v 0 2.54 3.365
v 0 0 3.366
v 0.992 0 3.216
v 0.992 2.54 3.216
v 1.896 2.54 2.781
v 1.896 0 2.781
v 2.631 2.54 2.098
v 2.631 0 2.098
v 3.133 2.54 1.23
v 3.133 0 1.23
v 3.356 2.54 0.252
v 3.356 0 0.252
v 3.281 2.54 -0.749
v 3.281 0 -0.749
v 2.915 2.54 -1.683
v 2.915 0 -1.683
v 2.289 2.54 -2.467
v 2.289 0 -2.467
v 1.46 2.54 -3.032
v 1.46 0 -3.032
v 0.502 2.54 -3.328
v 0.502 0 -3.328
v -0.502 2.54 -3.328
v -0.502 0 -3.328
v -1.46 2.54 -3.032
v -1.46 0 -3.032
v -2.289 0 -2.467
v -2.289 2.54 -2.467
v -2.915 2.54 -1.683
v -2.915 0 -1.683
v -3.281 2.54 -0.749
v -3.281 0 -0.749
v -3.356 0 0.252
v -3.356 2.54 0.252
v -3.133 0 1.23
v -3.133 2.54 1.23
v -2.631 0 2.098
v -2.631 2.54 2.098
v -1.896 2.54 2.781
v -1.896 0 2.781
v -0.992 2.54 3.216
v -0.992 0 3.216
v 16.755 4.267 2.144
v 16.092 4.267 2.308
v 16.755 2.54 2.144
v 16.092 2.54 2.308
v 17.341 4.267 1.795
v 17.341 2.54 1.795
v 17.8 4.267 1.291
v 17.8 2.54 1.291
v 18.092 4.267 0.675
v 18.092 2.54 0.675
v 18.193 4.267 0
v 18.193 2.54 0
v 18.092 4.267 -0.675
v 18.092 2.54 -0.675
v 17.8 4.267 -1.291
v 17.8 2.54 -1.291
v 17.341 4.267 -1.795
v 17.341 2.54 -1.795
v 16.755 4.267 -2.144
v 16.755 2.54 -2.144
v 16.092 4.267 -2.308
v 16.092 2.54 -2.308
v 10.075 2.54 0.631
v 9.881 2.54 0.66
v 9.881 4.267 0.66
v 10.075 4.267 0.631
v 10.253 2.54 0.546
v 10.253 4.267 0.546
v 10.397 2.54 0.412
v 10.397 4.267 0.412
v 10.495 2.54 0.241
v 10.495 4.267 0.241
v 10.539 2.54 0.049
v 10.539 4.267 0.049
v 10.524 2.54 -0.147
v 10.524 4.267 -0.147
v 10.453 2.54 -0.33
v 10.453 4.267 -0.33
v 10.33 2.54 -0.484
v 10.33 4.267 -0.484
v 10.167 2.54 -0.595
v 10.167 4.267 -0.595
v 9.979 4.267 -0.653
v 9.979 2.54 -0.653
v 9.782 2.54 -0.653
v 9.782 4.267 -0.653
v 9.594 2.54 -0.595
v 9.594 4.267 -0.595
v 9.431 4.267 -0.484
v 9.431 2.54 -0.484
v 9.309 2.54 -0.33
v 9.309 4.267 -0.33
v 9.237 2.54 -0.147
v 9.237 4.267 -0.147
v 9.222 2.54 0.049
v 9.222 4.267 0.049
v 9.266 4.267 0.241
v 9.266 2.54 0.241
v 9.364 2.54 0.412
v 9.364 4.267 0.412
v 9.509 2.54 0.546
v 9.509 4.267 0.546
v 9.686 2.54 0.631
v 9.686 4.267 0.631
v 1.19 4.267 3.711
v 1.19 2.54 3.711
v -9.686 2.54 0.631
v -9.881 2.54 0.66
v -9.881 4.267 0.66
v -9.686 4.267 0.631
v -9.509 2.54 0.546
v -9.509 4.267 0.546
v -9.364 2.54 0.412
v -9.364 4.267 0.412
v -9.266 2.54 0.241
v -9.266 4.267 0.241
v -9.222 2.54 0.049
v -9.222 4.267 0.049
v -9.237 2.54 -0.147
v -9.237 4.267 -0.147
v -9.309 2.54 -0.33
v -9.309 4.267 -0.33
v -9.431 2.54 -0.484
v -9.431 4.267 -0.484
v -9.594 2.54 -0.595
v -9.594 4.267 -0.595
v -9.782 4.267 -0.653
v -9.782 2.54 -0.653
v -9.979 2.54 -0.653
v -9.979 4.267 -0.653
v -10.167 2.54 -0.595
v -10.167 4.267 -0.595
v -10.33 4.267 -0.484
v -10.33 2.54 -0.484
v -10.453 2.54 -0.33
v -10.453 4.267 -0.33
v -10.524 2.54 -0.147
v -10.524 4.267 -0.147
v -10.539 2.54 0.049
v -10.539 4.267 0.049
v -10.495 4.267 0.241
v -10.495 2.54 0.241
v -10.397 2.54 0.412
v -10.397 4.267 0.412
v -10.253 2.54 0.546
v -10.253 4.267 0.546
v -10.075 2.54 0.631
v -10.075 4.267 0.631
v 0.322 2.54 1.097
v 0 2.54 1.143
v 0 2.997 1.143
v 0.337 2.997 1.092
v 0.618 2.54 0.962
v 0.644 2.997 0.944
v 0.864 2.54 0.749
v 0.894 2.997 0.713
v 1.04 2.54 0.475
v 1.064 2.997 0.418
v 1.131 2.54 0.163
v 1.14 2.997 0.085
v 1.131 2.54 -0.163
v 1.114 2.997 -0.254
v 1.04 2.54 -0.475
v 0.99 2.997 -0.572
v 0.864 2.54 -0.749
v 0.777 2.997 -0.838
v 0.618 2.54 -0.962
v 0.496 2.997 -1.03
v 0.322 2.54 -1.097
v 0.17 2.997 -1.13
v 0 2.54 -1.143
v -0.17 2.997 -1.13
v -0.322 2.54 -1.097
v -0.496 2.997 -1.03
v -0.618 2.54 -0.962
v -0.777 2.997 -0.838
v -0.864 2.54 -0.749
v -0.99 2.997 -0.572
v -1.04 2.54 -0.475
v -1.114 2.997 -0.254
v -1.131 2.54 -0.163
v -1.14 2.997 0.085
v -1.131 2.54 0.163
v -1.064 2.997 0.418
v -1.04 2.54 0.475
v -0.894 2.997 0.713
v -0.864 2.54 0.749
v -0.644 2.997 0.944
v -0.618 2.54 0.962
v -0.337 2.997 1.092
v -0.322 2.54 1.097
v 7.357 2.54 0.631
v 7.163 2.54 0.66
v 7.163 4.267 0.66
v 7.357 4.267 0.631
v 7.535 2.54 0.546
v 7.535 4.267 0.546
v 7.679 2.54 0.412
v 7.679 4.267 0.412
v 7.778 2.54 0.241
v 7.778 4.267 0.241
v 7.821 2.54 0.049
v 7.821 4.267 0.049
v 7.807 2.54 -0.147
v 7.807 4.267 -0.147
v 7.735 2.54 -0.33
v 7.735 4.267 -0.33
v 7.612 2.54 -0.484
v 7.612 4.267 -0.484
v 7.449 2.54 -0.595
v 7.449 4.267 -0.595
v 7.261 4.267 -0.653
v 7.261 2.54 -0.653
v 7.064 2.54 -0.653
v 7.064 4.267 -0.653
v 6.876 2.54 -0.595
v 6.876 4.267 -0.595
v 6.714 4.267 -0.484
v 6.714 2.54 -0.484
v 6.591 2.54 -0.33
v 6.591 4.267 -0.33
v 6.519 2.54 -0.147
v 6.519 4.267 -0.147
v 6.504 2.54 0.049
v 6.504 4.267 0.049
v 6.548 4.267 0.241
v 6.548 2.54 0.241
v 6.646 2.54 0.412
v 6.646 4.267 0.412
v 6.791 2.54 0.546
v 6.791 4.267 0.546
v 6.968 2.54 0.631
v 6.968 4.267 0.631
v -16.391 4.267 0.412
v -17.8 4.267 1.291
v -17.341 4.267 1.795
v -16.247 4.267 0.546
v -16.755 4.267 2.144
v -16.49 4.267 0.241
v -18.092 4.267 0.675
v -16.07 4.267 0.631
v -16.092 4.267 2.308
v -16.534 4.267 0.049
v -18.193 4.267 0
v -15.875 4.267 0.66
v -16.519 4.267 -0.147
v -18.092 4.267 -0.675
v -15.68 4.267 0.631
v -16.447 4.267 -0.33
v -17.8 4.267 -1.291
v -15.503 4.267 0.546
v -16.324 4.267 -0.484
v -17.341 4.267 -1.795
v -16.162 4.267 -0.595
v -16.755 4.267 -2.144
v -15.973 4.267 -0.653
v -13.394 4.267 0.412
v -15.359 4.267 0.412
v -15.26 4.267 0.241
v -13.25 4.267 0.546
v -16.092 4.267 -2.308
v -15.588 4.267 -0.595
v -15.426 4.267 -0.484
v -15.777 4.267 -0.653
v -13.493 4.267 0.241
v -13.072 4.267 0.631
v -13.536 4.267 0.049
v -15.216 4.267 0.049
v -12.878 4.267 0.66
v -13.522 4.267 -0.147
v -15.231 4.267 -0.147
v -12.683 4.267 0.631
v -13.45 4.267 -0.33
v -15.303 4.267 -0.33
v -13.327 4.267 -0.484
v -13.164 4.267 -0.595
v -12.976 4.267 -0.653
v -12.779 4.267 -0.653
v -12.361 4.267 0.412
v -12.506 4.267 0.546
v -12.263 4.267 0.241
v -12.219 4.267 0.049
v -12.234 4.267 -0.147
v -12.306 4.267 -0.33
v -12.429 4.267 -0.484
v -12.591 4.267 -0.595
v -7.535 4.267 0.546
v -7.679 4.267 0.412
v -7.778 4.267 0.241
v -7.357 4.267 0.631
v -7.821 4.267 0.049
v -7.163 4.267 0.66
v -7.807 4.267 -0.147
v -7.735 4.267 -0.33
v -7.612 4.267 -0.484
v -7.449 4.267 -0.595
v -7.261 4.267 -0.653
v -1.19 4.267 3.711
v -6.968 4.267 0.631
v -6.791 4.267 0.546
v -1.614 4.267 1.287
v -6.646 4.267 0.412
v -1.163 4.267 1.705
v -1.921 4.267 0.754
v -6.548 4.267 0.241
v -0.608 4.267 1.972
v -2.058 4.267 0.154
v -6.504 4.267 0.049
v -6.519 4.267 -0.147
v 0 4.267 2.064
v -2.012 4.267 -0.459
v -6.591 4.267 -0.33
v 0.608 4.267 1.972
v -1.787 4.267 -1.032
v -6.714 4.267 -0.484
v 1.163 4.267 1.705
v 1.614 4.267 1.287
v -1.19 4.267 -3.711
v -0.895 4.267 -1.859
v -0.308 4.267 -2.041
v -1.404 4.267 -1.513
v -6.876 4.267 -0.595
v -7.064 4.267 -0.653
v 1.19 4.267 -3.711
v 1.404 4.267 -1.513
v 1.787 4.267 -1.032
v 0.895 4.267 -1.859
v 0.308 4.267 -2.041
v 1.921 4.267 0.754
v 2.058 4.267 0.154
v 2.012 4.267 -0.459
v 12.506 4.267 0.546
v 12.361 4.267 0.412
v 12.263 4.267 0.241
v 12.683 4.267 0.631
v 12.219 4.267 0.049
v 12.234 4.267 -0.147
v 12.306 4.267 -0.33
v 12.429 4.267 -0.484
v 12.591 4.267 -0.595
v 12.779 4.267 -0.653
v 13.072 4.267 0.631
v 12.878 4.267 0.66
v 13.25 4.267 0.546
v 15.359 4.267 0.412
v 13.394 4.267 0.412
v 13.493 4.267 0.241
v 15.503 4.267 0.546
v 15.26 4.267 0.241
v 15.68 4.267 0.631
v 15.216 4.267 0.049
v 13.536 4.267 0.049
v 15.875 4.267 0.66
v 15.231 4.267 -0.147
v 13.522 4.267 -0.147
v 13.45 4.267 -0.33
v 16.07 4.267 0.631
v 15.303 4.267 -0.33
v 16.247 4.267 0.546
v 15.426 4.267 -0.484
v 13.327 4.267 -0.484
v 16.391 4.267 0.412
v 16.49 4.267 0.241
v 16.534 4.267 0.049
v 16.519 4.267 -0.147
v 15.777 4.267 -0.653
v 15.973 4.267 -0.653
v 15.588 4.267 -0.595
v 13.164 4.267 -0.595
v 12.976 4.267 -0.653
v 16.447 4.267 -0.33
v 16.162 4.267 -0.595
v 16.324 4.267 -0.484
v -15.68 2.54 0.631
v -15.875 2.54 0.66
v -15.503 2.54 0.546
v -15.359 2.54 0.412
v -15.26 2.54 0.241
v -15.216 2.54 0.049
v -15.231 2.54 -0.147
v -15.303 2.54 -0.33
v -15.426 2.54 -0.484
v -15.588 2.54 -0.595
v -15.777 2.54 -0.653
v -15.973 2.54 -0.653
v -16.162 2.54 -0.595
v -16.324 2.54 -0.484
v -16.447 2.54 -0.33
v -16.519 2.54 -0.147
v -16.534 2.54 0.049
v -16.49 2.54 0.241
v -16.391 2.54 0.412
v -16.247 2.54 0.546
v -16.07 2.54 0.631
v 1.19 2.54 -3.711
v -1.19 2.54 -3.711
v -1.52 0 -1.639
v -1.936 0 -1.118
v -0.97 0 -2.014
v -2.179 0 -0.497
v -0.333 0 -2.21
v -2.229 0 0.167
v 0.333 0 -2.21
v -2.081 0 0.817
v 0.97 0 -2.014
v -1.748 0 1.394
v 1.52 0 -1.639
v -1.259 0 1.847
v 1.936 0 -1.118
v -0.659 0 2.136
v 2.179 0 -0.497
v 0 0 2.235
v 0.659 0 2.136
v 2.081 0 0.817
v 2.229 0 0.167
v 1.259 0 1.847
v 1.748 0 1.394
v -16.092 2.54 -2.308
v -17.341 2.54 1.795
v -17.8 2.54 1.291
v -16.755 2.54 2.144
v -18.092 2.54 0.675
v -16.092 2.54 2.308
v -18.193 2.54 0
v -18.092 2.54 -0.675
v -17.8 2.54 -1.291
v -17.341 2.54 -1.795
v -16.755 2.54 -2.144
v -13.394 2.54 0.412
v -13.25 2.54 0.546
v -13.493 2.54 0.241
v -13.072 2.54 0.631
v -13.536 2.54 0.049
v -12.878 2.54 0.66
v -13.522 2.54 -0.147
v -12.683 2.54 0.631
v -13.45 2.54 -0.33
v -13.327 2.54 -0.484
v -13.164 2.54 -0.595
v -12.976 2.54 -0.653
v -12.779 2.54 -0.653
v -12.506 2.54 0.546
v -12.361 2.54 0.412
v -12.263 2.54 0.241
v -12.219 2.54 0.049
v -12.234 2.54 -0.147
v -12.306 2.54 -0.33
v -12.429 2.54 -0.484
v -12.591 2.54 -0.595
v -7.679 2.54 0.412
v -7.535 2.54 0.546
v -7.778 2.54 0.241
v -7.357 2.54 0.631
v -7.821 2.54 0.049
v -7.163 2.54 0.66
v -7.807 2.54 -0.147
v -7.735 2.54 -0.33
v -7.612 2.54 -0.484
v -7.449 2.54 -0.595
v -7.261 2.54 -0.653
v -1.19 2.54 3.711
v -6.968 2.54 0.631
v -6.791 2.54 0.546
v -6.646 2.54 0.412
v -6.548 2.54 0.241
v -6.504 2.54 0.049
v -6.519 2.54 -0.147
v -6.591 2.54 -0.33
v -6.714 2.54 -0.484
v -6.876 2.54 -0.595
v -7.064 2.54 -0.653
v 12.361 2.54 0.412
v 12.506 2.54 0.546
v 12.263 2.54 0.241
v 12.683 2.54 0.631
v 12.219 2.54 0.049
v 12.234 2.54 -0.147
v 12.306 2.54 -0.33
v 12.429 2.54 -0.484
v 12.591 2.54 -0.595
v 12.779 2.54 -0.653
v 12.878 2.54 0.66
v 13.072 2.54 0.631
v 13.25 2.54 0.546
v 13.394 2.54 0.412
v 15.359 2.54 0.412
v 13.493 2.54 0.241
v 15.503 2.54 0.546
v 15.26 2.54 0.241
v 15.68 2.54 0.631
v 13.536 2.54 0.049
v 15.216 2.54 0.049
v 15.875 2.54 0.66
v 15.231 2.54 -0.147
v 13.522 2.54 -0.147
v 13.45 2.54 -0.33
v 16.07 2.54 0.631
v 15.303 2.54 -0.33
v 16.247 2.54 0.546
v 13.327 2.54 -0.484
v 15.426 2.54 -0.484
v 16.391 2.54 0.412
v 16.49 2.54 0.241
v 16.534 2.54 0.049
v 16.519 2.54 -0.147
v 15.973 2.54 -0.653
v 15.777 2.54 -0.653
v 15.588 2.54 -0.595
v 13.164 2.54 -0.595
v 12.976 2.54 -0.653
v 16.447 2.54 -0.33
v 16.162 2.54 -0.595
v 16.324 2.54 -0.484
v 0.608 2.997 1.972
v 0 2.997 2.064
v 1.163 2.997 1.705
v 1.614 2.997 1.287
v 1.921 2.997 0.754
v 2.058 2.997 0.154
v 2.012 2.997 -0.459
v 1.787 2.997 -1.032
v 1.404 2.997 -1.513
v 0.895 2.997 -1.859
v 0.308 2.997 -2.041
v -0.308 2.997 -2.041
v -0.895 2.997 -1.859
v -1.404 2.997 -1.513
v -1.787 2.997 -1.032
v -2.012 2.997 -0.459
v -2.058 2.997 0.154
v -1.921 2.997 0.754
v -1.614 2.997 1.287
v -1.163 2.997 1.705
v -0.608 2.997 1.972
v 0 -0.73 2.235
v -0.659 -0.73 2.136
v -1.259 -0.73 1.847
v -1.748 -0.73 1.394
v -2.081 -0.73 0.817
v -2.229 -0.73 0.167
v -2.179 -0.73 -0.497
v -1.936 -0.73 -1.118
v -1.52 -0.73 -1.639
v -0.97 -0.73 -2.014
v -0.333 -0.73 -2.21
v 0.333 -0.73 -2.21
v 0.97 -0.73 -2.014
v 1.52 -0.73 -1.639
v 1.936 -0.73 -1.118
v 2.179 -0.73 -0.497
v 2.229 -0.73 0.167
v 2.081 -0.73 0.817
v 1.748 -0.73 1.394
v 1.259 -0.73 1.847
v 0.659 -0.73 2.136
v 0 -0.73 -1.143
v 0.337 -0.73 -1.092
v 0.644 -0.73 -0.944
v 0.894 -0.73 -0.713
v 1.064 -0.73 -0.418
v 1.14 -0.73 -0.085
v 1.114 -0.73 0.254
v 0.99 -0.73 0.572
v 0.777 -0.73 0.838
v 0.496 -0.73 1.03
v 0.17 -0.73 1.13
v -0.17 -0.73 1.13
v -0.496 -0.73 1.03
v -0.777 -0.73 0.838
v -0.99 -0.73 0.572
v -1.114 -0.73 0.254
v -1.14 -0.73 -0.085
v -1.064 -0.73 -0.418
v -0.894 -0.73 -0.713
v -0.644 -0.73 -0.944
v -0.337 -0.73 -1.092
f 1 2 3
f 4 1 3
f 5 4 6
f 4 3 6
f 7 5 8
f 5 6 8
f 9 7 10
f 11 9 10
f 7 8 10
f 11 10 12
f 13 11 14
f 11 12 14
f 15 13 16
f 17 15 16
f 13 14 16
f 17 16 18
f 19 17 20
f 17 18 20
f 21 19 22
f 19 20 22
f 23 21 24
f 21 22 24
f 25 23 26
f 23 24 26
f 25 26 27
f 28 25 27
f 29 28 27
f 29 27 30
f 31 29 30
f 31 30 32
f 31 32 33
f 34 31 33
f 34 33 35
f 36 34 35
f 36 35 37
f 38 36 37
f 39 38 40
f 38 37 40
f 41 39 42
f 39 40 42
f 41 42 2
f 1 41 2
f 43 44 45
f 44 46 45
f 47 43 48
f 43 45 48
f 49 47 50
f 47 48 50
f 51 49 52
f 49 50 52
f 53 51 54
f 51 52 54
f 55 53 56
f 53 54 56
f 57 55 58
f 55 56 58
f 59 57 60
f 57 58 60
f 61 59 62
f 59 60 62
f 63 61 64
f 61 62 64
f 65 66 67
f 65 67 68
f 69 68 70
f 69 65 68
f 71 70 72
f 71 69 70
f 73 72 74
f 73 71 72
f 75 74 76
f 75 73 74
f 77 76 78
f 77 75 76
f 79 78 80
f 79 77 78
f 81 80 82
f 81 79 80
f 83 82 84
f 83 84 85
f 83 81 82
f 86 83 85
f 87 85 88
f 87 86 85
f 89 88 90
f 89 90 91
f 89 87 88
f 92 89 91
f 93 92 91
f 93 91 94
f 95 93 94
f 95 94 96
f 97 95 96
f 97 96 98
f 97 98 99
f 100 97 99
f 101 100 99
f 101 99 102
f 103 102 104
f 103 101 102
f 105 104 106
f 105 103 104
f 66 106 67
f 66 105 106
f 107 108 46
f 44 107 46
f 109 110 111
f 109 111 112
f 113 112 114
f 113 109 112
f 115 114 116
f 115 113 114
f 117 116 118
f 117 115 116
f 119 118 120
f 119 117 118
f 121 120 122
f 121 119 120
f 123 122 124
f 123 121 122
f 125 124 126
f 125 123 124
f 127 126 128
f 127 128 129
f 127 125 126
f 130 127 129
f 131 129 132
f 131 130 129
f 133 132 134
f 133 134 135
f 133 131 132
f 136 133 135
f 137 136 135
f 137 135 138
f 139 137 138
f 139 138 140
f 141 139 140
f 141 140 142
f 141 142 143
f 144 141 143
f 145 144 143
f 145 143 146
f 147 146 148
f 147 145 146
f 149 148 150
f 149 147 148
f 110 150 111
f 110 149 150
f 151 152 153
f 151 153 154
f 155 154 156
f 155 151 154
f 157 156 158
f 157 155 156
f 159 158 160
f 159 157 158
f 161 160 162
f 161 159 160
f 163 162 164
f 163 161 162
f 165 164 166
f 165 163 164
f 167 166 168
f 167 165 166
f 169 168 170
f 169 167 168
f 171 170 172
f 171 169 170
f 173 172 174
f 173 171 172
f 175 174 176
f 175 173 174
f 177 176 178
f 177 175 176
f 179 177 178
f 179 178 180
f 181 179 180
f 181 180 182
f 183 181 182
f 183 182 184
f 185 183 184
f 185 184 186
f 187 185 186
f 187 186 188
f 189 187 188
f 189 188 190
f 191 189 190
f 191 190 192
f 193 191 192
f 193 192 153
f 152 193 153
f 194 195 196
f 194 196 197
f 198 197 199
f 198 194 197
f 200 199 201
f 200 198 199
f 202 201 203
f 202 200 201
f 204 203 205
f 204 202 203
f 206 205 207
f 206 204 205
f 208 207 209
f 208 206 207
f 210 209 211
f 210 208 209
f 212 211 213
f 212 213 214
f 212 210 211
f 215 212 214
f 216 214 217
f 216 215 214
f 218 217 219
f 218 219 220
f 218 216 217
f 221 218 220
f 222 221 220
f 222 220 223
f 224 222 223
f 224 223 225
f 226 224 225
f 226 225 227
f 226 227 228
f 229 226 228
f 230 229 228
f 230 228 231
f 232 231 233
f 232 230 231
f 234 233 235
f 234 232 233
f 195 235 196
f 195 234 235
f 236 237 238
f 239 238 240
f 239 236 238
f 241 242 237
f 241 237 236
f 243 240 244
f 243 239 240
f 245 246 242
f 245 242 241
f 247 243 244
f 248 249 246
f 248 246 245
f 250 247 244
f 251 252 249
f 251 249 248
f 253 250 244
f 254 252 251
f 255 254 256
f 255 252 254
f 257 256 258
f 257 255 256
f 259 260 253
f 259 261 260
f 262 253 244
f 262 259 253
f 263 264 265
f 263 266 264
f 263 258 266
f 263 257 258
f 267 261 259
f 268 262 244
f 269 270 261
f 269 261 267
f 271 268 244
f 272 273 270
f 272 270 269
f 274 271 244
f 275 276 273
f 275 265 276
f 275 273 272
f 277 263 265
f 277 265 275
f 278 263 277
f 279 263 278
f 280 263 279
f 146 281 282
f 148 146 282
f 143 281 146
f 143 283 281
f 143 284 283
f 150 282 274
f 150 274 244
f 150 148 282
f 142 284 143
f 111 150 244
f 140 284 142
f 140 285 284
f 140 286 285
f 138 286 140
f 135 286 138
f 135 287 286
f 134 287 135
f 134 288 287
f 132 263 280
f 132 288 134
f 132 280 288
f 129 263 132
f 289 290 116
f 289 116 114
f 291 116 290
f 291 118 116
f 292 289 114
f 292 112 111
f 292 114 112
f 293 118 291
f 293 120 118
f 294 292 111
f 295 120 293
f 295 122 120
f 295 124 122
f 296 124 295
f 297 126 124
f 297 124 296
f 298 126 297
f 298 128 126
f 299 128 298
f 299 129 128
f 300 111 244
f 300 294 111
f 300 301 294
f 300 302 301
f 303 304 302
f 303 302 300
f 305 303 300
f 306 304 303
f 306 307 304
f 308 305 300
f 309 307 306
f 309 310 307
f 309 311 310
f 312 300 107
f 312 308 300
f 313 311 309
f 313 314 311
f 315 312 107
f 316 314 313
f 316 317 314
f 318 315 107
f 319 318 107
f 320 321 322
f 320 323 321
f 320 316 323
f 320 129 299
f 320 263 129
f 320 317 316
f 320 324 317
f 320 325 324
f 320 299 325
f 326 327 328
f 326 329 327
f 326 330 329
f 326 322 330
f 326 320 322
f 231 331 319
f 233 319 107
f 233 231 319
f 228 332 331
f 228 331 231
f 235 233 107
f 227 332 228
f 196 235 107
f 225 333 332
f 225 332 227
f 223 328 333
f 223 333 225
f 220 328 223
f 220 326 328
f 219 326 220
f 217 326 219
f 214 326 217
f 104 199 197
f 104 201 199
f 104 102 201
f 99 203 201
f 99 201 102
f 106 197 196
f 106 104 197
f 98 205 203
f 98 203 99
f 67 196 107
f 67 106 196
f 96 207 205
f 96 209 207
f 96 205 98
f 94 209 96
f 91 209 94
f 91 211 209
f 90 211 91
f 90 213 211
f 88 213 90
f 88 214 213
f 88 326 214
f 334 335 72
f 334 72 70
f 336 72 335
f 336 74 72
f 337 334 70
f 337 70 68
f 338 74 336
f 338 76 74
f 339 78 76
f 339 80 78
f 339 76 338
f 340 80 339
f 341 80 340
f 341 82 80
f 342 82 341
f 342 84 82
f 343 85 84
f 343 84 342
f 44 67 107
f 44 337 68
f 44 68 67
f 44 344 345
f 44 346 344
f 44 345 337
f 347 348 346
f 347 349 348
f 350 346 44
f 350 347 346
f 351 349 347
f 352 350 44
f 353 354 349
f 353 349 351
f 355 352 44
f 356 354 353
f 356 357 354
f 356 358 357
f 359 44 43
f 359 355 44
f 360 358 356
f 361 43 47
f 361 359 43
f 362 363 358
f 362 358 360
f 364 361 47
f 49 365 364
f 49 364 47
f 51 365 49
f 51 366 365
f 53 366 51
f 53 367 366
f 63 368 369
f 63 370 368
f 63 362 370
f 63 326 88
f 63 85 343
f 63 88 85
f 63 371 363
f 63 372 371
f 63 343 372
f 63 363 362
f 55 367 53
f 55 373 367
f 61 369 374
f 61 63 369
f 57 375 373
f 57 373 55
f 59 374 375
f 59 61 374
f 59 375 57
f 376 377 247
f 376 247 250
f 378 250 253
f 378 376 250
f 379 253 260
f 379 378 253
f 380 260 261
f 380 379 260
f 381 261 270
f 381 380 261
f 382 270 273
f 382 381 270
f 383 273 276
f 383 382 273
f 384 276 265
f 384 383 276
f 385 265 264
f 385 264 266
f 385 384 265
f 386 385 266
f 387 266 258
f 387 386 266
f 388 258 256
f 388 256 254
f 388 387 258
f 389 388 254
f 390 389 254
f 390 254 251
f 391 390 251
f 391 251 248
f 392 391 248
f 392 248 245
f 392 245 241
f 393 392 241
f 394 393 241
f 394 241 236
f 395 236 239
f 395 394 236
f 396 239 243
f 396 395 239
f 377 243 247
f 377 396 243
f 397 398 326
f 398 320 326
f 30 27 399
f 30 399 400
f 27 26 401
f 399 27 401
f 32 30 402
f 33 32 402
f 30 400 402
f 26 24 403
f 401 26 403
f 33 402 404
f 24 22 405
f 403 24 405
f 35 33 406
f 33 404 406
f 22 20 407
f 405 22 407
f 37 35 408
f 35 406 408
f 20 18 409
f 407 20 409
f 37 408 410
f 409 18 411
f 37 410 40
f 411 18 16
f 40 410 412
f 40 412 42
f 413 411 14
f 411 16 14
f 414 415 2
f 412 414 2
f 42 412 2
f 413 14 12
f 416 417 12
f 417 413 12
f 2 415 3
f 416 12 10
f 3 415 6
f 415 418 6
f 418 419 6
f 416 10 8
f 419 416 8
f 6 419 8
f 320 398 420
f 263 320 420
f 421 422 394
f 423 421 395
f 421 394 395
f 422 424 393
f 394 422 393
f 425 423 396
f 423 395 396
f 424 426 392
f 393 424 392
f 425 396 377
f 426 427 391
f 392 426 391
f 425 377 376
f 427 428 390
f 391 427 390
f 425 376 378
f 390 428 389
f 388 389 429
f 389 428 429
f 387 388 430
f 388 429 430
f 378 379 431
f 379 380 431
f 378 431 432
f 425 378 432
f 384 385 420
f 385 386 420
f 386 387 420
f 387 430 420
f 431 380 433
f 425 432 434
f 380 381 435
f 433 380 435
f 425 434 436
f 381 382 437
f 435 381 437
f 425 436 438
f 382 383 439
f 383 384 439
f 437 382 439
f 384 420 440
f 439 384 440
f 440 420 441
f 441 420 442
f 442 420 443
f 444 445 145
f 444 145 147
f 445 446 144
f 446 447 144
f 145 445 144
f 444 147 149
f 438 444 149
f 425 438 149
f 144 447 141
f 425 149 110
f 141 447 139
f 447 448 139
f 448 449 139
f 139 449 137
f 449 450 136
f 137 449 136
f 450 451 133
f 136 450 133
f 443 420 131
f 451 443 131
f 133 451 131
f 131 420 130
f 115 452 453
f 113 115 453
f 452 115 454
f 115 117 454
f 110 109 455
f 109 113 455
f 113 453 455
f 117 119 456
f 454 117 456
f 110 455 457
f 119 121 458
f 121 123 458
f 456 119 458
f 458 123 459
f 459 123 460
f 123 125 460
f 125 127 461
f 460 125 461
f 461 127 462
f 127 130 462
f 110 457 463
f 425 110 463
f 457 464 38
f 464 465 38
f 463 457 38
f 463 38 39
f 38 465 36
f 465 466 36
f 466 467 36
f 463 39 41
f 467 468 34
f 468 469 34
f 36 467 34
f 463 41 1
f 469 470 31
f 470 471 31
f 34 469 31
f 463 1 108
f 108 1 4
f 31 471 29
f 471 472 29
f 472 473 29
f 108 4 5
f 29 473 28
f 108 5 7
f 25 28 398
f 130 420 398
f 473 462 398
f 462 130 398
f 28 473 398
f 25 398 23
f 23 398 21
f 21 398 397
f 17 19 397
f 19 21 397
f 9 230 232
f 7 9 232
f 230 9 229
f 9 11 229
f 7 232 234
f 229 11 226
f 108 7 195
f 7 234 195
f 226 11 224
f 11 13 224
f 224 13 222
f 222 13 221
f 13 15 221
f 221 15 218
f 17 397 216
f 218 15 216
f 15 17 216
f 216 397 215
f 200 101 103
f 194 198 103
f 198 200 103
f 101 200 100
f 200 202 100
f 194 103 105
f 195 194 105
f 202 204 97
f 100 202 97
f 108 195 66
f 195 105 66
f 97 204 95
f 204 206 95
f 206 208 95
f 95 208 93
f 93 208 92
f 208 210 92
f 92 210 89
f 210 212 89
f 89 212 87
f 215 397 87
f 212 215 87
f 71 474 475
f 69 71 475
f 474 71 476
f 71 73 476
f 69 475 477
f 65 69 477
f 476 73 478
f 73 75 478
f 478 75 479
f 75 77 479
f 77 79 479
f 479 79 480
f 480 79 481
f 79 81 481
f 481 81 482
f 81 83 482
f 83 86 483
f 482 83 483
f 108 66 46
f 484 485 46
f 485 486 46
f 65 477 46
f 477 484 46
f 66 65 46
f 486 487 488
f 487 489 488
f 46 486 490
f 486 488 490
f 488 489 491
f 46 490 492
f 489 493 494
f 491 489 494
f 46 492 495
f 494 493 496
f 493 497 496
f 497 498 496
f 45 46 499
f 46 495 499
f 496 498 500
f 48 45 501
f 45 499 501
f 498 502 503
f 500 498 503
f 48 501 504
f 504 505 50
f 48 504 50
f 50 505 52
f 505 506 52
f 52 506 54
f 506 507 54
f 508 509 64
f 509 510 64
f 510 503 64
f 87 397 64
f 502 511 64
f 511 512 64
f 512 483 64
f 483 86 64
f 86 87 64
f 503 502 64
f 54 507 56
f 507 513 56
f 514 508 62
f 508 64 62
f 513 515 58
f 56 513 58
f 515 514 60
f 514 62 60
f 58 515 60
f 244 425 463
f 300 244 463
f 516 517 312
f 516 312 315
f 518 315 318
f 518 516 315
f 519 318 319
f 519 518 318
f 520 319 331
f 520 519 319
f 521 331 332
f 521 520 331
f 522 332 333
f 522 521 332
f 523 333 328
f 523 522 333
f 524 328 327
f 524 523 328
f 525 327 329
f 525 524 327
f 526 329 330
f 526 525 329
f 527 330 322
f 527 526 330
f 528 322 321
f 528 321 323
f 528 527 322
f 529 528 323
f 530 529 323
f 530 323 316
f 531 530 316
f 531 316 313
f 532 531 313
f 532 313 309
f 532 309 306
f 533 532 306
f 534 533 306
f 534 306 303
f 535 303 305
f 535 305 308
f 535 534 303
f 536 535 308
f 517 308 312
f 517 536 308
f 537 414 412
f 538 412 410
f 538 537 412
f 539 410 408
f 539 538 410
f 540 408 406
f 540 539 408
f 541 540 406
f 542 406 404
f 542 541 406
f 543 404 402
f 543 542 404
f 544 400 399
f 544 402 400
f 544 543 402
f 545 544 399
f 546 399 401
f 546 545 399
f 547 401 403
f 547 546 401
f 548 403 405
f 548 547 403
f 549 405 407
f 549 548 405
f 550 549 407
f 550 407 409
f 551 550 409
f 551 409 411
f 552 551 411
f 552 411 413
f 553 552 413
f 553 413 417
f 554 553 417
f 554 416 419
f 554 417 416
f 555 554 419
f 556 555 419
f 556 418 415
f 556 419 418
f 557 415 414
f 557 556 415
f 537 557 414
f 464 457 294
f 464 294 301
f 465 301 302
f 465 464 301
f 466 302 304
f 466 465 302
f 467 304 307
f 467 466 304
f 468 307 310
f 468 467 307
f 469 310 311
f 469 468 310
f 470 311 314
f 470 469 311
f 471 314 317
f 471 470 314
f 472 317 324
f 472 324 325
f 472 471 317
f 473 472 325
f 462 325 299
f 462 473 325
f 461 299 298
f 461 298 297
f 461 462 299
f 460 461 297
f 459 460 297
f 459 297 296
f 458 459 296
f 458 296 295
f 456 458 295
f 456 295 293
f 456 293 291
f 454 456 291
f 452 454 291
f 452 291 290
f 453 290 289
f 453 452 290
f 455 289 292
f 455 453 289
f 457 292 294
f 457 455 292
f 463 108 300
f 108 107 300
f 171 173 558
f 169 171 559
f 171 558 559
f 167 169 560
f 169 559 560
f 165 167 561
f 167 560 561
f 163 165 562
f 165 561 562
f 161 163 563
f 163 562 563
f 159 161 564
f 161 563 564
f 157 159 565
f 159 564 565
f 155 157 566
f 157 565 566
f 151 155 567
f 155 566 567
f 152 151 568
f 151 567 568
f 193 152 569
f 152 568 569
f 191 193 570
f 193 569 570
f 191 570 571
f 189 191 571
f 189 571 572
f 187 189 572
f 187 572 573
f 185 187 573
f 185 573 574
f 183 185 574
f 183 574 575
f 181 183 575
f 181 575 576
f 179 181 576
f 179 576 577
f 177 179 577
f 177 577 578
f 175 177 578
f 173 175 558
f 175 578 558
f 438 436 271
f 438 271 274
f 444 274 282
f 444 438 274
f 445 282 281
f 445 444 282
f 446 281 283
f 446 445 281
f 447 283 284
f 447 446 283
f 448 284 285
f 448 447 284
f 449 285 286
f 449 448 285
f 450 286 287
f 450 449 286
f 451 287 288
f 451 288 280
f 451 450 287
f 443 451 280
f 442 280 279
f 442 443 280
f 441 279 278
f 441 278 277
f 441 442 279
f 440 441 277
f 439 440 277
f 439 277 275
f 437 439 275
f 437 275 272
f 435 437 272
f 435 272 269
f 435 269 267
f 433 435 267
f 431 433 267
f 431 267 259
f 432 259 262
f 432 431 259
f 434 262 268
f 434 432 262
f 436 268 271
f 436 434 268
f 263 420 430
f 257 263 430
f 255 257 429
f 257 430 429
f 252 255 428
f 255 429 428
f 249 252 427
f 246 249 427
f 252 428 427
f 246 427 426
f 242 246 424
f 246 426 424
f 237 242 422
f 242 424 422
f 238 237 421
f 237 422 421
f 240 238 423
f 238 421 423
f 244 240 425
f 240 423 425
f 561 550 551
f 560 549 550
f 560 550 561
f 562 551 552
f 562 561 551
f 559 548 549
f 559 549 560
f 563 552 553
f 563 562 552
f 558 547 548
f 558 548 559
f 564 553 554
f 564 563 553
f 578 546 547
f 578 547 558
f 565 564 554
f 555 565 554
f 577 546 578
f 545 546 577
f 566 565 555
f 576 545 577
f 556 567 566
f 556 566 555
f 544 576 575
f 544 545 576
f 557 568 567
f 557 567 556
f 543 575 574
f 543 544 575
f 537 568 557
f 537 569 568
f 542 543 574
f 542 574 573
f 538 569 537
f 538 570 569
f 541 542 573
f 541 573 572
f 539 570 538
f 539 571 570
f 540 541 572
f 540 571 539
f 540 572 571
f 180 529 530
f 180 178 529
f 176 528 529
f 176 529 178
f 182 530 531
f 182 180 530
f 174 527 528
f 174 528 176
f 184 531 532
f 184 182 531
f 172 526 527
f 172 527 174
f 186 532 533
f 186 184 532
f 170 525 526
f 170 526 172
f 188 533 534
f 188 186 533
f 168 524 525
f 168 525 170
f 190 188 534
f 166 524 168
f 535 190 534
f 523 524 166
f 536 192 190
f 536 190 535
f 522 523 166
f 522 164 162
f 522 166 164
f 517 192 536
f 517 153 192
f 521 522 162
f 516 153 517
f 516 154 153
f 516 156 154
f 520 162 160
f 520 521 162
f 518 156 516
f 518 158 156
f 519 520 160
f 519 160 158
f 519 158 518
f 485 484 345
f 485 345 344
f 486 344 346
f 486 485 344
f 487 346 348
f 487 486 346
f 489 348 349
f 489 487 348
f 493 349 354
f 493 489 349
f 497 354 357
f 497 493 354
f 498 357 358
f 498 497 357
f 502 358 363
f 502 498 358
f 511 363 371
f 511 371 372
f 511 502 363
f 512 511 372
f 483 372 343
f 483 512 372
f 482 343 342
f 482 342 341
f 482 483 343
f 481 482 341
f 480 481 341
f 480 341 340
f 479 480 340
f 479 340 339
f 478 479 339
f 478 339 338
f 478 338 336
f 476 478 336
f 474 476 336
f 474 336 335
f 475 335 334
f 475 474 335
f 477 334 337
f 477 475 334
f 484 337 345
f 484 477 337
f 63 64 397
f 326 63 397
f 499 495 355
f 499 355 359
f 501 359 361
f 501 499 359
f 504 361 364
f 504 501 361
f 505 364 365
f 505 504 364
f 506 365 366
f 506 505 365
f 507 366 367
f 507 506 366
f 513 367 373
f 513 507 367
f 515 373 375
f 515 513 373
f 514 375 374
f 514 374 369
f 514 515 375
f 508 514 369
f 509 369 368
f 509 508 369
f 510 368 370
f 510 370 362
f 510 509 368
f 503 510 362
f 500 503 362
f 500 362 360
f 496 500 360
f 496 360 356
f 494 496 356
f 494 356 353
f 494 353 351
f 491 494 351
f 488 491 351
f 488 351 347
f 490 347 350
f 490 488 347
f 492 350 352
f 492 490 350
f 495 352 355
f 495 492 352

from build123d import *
from build123d.topology import SkipClean

# Parameters (mm, degrees)
SKETCH1_R                = 3.3655
SKETCH1_R_2              = 2.2352
BOSS_EXTRUDE1_DEPTH      = 2.54
SKETCH2_R                = 0.6604
SKETCH2_R_2              = 2.31775
SKETCH2_R_3              = 3.3655
SKETCH2_R_4              = 2.2352
SKETCH2_R_5              = 1.143
BOSS_EXTRUDE2_DEPTH      = 1.7272
FILLET1_R                = 12.7
CUT_EXTRUDE1_START       = -1.27
SKETCH3_R                = 2.06375
SKETCH3_R_2              = 1.143
CUT_EXTRUDE1_DEPTH       = 1.27
RESSALTO_EXTRUS_O1_START = 3.27
ESBO_O1_R                = 2.2352
ESBO_O1_R_2              = 1.143
RESSALTO_EXTRUS_O1_DEPTH = 3.27


with BuildPart() as part:
    # Sketch1 → Boss-Extrude1 (new body)
    with BuildSketch(Plane(origin=(0, 0, 0), x_dir=(1, 0, 0), z_dir=(0, 1, 0))):
        with Locations(Location((0, 0, 0), (0, 0, 270))):
            Circle(SKETCH1_R)
        with Locations(Location((0, 0, 0), (0, 0, 270))):
            Circle(SKETCH1_R_2, mode=Mode.SUBTRACT)
    extrude(amount=BOSS_EXTRUDE1_DEPTH)

    # Sketch2 → Boss-Extrude2 (add)
    # profile 1 of 7: a face of its own
    with BuildSketch(Plane(origin=(0, 2.54, 0), x_dir=(1, 0, 0), z_dir=(0, 1, 0))):
        with BuildLine():
            ThreePointArc((-0.713521748, -3.755518873), (-3.8227, 0), (-0.713521748, 3.755518873))
            Line((-0.713521748, 3.755518873), (-16.092265178, 2.307544345))
            ThreePointArc((-16.092265178, 2.307544345), (-14.314807913, 1.713991165), (-13.55725, 0))
            ThreePointArc((-13.55725, 0), (-14.314807913, -1.713991165), (-16.092265178, -2.307544345))
            Line((-16.092265178, -2.307544345), (-0.713521748, -3.755518873))
        make_face()
        with Locations(Location((-12.8778, 0, 0), (0, 0, 270))):
            Circle(SKETCH2_R, mode=Mode.SUBTRACT)
        with Locations(Location((-9.8806, 0, 0), (0, 0, 270))):
            Circle(SKETCH2_R, mode=Mode.SUBTRACT)
        with Locations(Location((-7.1628, 0, 0), (0, 0, 270))):
            Circle(SKETCH2_R, mode=Mode.SUBTRACT)
    # profile 2 of 7: a face of its own
    with BuildSketch(Plane(origin=(0, 2.54, 0), x_dir=(1, 0, 0), z_dir=(0, 1, 0))):
        with Locations((-15.875, 0)):
            Circle(SKETCH2_R_2)
        with Locations(Location((-15.875, 0, 0), (0, 0, 270))):
            Circle(SKETCH2_R, mode=Mode.SUBTRACT)
    # profile 3 of 7: a face of its own
    with BuildSketch(Plane(origin=(0, 2.54, 0), x_dir=(1, 0, 0), z_dir=(0, 1, 0))):
        with BuildLine():
            Line((16.092265178, 2.307544345), (0.713521748, 3.755518873))
            ThreePointArc((0.713521748, 3.755518873), (2.944538578, 2.437771083), (3.8227, 0))
            ThreePointArc((3.8227, 0), (2.944538578, -2.437771083), (0.713521748, -3.755518873))
            Line((0.713521748, -3.755518873), (16.092265178, -2.307544345))
            ThreePointArc((16.092265178, -2.307544345), (13.55725, 0), (16.092265178, 2.307544345))
        make_face()
        with Locations(Location((7.1628, 0, 0), (0, 0, 270))):
            Circle(SKETCH2_R, mode=Mode.SUBTRACT)
        with Locations(Location((9.8806, 0, 0), (0, 0, 270))):
            Circle(SKETCH2_R, mode=Mode.SUBTRACT)
        with Locations(Location((12.8778, 0, 0), (0, 0, 270))):
            Circle(SKETCH2_R, mode=Mode.SUBTRACT)
    # profile 4 of 7: a face of its own
    with BuildSketch(Plane(origin=(0, 2.54, 0), x_dir=(1, 0, 0), z_dir=(0, 1, 0))):
        with Locations((15.875, 0)):
            Circle(SKETCH2_R_2)
        with Locations(Location((15.875, 0, 0), (0, 0, 270))):
            Circle(SKETCH2_R, mode=Mode.SUBTRACT)
    # profile 5 of 7: a face of its own
    with BuildSketch(Plane(origin=(0, 2.54, 0), x_dir=(1, 0, 0), z_dir=(0, 1, 0))):
        with BuildLine():
            Line((0.713521748, 3.755518873), (0, 3.8227))
            Line((0, 3.8227), (-0.713521748, 3.755518873))
            ThreePointArc((-0.713521748, 3.755518873), (-3.8227, 0), (-0.713521748, -3.755518873))
            Line((-0.713521748, -3.755518873), (0, -3.8227))
            Line((0, -3.8227), (0.713521748, -3.755518873))
            ThreePointArc((0.713521748, -3.755518873), (2.944538578, -2.437771083), (3.8227, 0))
            ThreePointArc((3.8227, 0), (2.944538578, 2.437771083), (0.713521748, 3.755518873))
        make_face()
        with Locations(Location((0, 0, 0), (0, 0, 270))):
            Circle(SKETCH2_R_3, mode=Mode.SUBTRACT)
    # profile 6 of 7: a face of its own
    with BuildSketch(Plane(origin=(0, 2.54, 0), x_dir=(1, 0, 0), z_dir=(0, 1, 0))):
        with Locations(Location((0, 0, 0), (0, 0, 270))):
            Circle(SKETCH2_R_3)
        with Locations(Location((0, 0, 0), (0, 0, 270))):
            Circle(SKETCH2_R_4, mode=Mode.SUBTRACT)
    # profile 7 of 7: a face of its own
    with BuildSketch(Plane(origin=(0, 2.54, 0), x_dir=(1, 0, 0), z_dir=(0, 1, 0))):
        with Locations(Location((0, 0, 0), (0, 0, 270))):
            Circle(SKETCH2_R_4)
        with Locations(Location((0, 0, 0), (0, 0, 270))):
            Circle(SKETCH2_R_5, mode=Mode.SUBTRACT)
    extrude(amount=BOSS_EXTRUDE2_DEPTH)

    # Fillet1
    fillet1_edges = [part.edges().sort_by_distance(p)[0] for p in [
        (0, 3.4036, -3.8227),
        (0, 3.4036, 3.8227),
    ]]
    fillet(fillet1_edges, radius=FILLET1_R)

    # Sketch3 → Cut-Extrude1 (cut)
    with BuildSketch(Plane(origin=(0, 4.2672, 0), x_dir=(1, 0, 0), z_dir=(0, 1, 0)).offset(CUT_EXTRUDE1_START)):
        with Locations(Location((0, 0, 0), (0, 0, 270))):
            Circle(SKETCH3_R)
        with Locations(Location((0, 0, 0), (0, 0, 270))):
            Circle(SKETCH3_R_2, mode=Mode.SUBTRACT)
    extrude(amount=CUT_EXTRUDE1_DEPTH, mode=Mode.SUBTRACT)

    # Esboço1 → Ressalto-extrusão1 (add)
    with SkipClean():  # the faces are left unmerged after this step: merging them gives an invalid solid
        with BuildSketch(Plane.XZ.offset(-2.54).offset(RESSALTO_EXTRUS_O1_START)):
            with Locations(Location((0, 0, 0), (0, 0, 90))):
                Circle(ESBO_O1_R)
            with Locations(Location((0, 0, 0), (0, 0, 270))):
                Circle(ESBO_O1_R_2, mode=Mode.SUBTRACT)
        extrude(amount=-RESSALTO_EXTRUS_O1_DEPTH)


solid = part.part
